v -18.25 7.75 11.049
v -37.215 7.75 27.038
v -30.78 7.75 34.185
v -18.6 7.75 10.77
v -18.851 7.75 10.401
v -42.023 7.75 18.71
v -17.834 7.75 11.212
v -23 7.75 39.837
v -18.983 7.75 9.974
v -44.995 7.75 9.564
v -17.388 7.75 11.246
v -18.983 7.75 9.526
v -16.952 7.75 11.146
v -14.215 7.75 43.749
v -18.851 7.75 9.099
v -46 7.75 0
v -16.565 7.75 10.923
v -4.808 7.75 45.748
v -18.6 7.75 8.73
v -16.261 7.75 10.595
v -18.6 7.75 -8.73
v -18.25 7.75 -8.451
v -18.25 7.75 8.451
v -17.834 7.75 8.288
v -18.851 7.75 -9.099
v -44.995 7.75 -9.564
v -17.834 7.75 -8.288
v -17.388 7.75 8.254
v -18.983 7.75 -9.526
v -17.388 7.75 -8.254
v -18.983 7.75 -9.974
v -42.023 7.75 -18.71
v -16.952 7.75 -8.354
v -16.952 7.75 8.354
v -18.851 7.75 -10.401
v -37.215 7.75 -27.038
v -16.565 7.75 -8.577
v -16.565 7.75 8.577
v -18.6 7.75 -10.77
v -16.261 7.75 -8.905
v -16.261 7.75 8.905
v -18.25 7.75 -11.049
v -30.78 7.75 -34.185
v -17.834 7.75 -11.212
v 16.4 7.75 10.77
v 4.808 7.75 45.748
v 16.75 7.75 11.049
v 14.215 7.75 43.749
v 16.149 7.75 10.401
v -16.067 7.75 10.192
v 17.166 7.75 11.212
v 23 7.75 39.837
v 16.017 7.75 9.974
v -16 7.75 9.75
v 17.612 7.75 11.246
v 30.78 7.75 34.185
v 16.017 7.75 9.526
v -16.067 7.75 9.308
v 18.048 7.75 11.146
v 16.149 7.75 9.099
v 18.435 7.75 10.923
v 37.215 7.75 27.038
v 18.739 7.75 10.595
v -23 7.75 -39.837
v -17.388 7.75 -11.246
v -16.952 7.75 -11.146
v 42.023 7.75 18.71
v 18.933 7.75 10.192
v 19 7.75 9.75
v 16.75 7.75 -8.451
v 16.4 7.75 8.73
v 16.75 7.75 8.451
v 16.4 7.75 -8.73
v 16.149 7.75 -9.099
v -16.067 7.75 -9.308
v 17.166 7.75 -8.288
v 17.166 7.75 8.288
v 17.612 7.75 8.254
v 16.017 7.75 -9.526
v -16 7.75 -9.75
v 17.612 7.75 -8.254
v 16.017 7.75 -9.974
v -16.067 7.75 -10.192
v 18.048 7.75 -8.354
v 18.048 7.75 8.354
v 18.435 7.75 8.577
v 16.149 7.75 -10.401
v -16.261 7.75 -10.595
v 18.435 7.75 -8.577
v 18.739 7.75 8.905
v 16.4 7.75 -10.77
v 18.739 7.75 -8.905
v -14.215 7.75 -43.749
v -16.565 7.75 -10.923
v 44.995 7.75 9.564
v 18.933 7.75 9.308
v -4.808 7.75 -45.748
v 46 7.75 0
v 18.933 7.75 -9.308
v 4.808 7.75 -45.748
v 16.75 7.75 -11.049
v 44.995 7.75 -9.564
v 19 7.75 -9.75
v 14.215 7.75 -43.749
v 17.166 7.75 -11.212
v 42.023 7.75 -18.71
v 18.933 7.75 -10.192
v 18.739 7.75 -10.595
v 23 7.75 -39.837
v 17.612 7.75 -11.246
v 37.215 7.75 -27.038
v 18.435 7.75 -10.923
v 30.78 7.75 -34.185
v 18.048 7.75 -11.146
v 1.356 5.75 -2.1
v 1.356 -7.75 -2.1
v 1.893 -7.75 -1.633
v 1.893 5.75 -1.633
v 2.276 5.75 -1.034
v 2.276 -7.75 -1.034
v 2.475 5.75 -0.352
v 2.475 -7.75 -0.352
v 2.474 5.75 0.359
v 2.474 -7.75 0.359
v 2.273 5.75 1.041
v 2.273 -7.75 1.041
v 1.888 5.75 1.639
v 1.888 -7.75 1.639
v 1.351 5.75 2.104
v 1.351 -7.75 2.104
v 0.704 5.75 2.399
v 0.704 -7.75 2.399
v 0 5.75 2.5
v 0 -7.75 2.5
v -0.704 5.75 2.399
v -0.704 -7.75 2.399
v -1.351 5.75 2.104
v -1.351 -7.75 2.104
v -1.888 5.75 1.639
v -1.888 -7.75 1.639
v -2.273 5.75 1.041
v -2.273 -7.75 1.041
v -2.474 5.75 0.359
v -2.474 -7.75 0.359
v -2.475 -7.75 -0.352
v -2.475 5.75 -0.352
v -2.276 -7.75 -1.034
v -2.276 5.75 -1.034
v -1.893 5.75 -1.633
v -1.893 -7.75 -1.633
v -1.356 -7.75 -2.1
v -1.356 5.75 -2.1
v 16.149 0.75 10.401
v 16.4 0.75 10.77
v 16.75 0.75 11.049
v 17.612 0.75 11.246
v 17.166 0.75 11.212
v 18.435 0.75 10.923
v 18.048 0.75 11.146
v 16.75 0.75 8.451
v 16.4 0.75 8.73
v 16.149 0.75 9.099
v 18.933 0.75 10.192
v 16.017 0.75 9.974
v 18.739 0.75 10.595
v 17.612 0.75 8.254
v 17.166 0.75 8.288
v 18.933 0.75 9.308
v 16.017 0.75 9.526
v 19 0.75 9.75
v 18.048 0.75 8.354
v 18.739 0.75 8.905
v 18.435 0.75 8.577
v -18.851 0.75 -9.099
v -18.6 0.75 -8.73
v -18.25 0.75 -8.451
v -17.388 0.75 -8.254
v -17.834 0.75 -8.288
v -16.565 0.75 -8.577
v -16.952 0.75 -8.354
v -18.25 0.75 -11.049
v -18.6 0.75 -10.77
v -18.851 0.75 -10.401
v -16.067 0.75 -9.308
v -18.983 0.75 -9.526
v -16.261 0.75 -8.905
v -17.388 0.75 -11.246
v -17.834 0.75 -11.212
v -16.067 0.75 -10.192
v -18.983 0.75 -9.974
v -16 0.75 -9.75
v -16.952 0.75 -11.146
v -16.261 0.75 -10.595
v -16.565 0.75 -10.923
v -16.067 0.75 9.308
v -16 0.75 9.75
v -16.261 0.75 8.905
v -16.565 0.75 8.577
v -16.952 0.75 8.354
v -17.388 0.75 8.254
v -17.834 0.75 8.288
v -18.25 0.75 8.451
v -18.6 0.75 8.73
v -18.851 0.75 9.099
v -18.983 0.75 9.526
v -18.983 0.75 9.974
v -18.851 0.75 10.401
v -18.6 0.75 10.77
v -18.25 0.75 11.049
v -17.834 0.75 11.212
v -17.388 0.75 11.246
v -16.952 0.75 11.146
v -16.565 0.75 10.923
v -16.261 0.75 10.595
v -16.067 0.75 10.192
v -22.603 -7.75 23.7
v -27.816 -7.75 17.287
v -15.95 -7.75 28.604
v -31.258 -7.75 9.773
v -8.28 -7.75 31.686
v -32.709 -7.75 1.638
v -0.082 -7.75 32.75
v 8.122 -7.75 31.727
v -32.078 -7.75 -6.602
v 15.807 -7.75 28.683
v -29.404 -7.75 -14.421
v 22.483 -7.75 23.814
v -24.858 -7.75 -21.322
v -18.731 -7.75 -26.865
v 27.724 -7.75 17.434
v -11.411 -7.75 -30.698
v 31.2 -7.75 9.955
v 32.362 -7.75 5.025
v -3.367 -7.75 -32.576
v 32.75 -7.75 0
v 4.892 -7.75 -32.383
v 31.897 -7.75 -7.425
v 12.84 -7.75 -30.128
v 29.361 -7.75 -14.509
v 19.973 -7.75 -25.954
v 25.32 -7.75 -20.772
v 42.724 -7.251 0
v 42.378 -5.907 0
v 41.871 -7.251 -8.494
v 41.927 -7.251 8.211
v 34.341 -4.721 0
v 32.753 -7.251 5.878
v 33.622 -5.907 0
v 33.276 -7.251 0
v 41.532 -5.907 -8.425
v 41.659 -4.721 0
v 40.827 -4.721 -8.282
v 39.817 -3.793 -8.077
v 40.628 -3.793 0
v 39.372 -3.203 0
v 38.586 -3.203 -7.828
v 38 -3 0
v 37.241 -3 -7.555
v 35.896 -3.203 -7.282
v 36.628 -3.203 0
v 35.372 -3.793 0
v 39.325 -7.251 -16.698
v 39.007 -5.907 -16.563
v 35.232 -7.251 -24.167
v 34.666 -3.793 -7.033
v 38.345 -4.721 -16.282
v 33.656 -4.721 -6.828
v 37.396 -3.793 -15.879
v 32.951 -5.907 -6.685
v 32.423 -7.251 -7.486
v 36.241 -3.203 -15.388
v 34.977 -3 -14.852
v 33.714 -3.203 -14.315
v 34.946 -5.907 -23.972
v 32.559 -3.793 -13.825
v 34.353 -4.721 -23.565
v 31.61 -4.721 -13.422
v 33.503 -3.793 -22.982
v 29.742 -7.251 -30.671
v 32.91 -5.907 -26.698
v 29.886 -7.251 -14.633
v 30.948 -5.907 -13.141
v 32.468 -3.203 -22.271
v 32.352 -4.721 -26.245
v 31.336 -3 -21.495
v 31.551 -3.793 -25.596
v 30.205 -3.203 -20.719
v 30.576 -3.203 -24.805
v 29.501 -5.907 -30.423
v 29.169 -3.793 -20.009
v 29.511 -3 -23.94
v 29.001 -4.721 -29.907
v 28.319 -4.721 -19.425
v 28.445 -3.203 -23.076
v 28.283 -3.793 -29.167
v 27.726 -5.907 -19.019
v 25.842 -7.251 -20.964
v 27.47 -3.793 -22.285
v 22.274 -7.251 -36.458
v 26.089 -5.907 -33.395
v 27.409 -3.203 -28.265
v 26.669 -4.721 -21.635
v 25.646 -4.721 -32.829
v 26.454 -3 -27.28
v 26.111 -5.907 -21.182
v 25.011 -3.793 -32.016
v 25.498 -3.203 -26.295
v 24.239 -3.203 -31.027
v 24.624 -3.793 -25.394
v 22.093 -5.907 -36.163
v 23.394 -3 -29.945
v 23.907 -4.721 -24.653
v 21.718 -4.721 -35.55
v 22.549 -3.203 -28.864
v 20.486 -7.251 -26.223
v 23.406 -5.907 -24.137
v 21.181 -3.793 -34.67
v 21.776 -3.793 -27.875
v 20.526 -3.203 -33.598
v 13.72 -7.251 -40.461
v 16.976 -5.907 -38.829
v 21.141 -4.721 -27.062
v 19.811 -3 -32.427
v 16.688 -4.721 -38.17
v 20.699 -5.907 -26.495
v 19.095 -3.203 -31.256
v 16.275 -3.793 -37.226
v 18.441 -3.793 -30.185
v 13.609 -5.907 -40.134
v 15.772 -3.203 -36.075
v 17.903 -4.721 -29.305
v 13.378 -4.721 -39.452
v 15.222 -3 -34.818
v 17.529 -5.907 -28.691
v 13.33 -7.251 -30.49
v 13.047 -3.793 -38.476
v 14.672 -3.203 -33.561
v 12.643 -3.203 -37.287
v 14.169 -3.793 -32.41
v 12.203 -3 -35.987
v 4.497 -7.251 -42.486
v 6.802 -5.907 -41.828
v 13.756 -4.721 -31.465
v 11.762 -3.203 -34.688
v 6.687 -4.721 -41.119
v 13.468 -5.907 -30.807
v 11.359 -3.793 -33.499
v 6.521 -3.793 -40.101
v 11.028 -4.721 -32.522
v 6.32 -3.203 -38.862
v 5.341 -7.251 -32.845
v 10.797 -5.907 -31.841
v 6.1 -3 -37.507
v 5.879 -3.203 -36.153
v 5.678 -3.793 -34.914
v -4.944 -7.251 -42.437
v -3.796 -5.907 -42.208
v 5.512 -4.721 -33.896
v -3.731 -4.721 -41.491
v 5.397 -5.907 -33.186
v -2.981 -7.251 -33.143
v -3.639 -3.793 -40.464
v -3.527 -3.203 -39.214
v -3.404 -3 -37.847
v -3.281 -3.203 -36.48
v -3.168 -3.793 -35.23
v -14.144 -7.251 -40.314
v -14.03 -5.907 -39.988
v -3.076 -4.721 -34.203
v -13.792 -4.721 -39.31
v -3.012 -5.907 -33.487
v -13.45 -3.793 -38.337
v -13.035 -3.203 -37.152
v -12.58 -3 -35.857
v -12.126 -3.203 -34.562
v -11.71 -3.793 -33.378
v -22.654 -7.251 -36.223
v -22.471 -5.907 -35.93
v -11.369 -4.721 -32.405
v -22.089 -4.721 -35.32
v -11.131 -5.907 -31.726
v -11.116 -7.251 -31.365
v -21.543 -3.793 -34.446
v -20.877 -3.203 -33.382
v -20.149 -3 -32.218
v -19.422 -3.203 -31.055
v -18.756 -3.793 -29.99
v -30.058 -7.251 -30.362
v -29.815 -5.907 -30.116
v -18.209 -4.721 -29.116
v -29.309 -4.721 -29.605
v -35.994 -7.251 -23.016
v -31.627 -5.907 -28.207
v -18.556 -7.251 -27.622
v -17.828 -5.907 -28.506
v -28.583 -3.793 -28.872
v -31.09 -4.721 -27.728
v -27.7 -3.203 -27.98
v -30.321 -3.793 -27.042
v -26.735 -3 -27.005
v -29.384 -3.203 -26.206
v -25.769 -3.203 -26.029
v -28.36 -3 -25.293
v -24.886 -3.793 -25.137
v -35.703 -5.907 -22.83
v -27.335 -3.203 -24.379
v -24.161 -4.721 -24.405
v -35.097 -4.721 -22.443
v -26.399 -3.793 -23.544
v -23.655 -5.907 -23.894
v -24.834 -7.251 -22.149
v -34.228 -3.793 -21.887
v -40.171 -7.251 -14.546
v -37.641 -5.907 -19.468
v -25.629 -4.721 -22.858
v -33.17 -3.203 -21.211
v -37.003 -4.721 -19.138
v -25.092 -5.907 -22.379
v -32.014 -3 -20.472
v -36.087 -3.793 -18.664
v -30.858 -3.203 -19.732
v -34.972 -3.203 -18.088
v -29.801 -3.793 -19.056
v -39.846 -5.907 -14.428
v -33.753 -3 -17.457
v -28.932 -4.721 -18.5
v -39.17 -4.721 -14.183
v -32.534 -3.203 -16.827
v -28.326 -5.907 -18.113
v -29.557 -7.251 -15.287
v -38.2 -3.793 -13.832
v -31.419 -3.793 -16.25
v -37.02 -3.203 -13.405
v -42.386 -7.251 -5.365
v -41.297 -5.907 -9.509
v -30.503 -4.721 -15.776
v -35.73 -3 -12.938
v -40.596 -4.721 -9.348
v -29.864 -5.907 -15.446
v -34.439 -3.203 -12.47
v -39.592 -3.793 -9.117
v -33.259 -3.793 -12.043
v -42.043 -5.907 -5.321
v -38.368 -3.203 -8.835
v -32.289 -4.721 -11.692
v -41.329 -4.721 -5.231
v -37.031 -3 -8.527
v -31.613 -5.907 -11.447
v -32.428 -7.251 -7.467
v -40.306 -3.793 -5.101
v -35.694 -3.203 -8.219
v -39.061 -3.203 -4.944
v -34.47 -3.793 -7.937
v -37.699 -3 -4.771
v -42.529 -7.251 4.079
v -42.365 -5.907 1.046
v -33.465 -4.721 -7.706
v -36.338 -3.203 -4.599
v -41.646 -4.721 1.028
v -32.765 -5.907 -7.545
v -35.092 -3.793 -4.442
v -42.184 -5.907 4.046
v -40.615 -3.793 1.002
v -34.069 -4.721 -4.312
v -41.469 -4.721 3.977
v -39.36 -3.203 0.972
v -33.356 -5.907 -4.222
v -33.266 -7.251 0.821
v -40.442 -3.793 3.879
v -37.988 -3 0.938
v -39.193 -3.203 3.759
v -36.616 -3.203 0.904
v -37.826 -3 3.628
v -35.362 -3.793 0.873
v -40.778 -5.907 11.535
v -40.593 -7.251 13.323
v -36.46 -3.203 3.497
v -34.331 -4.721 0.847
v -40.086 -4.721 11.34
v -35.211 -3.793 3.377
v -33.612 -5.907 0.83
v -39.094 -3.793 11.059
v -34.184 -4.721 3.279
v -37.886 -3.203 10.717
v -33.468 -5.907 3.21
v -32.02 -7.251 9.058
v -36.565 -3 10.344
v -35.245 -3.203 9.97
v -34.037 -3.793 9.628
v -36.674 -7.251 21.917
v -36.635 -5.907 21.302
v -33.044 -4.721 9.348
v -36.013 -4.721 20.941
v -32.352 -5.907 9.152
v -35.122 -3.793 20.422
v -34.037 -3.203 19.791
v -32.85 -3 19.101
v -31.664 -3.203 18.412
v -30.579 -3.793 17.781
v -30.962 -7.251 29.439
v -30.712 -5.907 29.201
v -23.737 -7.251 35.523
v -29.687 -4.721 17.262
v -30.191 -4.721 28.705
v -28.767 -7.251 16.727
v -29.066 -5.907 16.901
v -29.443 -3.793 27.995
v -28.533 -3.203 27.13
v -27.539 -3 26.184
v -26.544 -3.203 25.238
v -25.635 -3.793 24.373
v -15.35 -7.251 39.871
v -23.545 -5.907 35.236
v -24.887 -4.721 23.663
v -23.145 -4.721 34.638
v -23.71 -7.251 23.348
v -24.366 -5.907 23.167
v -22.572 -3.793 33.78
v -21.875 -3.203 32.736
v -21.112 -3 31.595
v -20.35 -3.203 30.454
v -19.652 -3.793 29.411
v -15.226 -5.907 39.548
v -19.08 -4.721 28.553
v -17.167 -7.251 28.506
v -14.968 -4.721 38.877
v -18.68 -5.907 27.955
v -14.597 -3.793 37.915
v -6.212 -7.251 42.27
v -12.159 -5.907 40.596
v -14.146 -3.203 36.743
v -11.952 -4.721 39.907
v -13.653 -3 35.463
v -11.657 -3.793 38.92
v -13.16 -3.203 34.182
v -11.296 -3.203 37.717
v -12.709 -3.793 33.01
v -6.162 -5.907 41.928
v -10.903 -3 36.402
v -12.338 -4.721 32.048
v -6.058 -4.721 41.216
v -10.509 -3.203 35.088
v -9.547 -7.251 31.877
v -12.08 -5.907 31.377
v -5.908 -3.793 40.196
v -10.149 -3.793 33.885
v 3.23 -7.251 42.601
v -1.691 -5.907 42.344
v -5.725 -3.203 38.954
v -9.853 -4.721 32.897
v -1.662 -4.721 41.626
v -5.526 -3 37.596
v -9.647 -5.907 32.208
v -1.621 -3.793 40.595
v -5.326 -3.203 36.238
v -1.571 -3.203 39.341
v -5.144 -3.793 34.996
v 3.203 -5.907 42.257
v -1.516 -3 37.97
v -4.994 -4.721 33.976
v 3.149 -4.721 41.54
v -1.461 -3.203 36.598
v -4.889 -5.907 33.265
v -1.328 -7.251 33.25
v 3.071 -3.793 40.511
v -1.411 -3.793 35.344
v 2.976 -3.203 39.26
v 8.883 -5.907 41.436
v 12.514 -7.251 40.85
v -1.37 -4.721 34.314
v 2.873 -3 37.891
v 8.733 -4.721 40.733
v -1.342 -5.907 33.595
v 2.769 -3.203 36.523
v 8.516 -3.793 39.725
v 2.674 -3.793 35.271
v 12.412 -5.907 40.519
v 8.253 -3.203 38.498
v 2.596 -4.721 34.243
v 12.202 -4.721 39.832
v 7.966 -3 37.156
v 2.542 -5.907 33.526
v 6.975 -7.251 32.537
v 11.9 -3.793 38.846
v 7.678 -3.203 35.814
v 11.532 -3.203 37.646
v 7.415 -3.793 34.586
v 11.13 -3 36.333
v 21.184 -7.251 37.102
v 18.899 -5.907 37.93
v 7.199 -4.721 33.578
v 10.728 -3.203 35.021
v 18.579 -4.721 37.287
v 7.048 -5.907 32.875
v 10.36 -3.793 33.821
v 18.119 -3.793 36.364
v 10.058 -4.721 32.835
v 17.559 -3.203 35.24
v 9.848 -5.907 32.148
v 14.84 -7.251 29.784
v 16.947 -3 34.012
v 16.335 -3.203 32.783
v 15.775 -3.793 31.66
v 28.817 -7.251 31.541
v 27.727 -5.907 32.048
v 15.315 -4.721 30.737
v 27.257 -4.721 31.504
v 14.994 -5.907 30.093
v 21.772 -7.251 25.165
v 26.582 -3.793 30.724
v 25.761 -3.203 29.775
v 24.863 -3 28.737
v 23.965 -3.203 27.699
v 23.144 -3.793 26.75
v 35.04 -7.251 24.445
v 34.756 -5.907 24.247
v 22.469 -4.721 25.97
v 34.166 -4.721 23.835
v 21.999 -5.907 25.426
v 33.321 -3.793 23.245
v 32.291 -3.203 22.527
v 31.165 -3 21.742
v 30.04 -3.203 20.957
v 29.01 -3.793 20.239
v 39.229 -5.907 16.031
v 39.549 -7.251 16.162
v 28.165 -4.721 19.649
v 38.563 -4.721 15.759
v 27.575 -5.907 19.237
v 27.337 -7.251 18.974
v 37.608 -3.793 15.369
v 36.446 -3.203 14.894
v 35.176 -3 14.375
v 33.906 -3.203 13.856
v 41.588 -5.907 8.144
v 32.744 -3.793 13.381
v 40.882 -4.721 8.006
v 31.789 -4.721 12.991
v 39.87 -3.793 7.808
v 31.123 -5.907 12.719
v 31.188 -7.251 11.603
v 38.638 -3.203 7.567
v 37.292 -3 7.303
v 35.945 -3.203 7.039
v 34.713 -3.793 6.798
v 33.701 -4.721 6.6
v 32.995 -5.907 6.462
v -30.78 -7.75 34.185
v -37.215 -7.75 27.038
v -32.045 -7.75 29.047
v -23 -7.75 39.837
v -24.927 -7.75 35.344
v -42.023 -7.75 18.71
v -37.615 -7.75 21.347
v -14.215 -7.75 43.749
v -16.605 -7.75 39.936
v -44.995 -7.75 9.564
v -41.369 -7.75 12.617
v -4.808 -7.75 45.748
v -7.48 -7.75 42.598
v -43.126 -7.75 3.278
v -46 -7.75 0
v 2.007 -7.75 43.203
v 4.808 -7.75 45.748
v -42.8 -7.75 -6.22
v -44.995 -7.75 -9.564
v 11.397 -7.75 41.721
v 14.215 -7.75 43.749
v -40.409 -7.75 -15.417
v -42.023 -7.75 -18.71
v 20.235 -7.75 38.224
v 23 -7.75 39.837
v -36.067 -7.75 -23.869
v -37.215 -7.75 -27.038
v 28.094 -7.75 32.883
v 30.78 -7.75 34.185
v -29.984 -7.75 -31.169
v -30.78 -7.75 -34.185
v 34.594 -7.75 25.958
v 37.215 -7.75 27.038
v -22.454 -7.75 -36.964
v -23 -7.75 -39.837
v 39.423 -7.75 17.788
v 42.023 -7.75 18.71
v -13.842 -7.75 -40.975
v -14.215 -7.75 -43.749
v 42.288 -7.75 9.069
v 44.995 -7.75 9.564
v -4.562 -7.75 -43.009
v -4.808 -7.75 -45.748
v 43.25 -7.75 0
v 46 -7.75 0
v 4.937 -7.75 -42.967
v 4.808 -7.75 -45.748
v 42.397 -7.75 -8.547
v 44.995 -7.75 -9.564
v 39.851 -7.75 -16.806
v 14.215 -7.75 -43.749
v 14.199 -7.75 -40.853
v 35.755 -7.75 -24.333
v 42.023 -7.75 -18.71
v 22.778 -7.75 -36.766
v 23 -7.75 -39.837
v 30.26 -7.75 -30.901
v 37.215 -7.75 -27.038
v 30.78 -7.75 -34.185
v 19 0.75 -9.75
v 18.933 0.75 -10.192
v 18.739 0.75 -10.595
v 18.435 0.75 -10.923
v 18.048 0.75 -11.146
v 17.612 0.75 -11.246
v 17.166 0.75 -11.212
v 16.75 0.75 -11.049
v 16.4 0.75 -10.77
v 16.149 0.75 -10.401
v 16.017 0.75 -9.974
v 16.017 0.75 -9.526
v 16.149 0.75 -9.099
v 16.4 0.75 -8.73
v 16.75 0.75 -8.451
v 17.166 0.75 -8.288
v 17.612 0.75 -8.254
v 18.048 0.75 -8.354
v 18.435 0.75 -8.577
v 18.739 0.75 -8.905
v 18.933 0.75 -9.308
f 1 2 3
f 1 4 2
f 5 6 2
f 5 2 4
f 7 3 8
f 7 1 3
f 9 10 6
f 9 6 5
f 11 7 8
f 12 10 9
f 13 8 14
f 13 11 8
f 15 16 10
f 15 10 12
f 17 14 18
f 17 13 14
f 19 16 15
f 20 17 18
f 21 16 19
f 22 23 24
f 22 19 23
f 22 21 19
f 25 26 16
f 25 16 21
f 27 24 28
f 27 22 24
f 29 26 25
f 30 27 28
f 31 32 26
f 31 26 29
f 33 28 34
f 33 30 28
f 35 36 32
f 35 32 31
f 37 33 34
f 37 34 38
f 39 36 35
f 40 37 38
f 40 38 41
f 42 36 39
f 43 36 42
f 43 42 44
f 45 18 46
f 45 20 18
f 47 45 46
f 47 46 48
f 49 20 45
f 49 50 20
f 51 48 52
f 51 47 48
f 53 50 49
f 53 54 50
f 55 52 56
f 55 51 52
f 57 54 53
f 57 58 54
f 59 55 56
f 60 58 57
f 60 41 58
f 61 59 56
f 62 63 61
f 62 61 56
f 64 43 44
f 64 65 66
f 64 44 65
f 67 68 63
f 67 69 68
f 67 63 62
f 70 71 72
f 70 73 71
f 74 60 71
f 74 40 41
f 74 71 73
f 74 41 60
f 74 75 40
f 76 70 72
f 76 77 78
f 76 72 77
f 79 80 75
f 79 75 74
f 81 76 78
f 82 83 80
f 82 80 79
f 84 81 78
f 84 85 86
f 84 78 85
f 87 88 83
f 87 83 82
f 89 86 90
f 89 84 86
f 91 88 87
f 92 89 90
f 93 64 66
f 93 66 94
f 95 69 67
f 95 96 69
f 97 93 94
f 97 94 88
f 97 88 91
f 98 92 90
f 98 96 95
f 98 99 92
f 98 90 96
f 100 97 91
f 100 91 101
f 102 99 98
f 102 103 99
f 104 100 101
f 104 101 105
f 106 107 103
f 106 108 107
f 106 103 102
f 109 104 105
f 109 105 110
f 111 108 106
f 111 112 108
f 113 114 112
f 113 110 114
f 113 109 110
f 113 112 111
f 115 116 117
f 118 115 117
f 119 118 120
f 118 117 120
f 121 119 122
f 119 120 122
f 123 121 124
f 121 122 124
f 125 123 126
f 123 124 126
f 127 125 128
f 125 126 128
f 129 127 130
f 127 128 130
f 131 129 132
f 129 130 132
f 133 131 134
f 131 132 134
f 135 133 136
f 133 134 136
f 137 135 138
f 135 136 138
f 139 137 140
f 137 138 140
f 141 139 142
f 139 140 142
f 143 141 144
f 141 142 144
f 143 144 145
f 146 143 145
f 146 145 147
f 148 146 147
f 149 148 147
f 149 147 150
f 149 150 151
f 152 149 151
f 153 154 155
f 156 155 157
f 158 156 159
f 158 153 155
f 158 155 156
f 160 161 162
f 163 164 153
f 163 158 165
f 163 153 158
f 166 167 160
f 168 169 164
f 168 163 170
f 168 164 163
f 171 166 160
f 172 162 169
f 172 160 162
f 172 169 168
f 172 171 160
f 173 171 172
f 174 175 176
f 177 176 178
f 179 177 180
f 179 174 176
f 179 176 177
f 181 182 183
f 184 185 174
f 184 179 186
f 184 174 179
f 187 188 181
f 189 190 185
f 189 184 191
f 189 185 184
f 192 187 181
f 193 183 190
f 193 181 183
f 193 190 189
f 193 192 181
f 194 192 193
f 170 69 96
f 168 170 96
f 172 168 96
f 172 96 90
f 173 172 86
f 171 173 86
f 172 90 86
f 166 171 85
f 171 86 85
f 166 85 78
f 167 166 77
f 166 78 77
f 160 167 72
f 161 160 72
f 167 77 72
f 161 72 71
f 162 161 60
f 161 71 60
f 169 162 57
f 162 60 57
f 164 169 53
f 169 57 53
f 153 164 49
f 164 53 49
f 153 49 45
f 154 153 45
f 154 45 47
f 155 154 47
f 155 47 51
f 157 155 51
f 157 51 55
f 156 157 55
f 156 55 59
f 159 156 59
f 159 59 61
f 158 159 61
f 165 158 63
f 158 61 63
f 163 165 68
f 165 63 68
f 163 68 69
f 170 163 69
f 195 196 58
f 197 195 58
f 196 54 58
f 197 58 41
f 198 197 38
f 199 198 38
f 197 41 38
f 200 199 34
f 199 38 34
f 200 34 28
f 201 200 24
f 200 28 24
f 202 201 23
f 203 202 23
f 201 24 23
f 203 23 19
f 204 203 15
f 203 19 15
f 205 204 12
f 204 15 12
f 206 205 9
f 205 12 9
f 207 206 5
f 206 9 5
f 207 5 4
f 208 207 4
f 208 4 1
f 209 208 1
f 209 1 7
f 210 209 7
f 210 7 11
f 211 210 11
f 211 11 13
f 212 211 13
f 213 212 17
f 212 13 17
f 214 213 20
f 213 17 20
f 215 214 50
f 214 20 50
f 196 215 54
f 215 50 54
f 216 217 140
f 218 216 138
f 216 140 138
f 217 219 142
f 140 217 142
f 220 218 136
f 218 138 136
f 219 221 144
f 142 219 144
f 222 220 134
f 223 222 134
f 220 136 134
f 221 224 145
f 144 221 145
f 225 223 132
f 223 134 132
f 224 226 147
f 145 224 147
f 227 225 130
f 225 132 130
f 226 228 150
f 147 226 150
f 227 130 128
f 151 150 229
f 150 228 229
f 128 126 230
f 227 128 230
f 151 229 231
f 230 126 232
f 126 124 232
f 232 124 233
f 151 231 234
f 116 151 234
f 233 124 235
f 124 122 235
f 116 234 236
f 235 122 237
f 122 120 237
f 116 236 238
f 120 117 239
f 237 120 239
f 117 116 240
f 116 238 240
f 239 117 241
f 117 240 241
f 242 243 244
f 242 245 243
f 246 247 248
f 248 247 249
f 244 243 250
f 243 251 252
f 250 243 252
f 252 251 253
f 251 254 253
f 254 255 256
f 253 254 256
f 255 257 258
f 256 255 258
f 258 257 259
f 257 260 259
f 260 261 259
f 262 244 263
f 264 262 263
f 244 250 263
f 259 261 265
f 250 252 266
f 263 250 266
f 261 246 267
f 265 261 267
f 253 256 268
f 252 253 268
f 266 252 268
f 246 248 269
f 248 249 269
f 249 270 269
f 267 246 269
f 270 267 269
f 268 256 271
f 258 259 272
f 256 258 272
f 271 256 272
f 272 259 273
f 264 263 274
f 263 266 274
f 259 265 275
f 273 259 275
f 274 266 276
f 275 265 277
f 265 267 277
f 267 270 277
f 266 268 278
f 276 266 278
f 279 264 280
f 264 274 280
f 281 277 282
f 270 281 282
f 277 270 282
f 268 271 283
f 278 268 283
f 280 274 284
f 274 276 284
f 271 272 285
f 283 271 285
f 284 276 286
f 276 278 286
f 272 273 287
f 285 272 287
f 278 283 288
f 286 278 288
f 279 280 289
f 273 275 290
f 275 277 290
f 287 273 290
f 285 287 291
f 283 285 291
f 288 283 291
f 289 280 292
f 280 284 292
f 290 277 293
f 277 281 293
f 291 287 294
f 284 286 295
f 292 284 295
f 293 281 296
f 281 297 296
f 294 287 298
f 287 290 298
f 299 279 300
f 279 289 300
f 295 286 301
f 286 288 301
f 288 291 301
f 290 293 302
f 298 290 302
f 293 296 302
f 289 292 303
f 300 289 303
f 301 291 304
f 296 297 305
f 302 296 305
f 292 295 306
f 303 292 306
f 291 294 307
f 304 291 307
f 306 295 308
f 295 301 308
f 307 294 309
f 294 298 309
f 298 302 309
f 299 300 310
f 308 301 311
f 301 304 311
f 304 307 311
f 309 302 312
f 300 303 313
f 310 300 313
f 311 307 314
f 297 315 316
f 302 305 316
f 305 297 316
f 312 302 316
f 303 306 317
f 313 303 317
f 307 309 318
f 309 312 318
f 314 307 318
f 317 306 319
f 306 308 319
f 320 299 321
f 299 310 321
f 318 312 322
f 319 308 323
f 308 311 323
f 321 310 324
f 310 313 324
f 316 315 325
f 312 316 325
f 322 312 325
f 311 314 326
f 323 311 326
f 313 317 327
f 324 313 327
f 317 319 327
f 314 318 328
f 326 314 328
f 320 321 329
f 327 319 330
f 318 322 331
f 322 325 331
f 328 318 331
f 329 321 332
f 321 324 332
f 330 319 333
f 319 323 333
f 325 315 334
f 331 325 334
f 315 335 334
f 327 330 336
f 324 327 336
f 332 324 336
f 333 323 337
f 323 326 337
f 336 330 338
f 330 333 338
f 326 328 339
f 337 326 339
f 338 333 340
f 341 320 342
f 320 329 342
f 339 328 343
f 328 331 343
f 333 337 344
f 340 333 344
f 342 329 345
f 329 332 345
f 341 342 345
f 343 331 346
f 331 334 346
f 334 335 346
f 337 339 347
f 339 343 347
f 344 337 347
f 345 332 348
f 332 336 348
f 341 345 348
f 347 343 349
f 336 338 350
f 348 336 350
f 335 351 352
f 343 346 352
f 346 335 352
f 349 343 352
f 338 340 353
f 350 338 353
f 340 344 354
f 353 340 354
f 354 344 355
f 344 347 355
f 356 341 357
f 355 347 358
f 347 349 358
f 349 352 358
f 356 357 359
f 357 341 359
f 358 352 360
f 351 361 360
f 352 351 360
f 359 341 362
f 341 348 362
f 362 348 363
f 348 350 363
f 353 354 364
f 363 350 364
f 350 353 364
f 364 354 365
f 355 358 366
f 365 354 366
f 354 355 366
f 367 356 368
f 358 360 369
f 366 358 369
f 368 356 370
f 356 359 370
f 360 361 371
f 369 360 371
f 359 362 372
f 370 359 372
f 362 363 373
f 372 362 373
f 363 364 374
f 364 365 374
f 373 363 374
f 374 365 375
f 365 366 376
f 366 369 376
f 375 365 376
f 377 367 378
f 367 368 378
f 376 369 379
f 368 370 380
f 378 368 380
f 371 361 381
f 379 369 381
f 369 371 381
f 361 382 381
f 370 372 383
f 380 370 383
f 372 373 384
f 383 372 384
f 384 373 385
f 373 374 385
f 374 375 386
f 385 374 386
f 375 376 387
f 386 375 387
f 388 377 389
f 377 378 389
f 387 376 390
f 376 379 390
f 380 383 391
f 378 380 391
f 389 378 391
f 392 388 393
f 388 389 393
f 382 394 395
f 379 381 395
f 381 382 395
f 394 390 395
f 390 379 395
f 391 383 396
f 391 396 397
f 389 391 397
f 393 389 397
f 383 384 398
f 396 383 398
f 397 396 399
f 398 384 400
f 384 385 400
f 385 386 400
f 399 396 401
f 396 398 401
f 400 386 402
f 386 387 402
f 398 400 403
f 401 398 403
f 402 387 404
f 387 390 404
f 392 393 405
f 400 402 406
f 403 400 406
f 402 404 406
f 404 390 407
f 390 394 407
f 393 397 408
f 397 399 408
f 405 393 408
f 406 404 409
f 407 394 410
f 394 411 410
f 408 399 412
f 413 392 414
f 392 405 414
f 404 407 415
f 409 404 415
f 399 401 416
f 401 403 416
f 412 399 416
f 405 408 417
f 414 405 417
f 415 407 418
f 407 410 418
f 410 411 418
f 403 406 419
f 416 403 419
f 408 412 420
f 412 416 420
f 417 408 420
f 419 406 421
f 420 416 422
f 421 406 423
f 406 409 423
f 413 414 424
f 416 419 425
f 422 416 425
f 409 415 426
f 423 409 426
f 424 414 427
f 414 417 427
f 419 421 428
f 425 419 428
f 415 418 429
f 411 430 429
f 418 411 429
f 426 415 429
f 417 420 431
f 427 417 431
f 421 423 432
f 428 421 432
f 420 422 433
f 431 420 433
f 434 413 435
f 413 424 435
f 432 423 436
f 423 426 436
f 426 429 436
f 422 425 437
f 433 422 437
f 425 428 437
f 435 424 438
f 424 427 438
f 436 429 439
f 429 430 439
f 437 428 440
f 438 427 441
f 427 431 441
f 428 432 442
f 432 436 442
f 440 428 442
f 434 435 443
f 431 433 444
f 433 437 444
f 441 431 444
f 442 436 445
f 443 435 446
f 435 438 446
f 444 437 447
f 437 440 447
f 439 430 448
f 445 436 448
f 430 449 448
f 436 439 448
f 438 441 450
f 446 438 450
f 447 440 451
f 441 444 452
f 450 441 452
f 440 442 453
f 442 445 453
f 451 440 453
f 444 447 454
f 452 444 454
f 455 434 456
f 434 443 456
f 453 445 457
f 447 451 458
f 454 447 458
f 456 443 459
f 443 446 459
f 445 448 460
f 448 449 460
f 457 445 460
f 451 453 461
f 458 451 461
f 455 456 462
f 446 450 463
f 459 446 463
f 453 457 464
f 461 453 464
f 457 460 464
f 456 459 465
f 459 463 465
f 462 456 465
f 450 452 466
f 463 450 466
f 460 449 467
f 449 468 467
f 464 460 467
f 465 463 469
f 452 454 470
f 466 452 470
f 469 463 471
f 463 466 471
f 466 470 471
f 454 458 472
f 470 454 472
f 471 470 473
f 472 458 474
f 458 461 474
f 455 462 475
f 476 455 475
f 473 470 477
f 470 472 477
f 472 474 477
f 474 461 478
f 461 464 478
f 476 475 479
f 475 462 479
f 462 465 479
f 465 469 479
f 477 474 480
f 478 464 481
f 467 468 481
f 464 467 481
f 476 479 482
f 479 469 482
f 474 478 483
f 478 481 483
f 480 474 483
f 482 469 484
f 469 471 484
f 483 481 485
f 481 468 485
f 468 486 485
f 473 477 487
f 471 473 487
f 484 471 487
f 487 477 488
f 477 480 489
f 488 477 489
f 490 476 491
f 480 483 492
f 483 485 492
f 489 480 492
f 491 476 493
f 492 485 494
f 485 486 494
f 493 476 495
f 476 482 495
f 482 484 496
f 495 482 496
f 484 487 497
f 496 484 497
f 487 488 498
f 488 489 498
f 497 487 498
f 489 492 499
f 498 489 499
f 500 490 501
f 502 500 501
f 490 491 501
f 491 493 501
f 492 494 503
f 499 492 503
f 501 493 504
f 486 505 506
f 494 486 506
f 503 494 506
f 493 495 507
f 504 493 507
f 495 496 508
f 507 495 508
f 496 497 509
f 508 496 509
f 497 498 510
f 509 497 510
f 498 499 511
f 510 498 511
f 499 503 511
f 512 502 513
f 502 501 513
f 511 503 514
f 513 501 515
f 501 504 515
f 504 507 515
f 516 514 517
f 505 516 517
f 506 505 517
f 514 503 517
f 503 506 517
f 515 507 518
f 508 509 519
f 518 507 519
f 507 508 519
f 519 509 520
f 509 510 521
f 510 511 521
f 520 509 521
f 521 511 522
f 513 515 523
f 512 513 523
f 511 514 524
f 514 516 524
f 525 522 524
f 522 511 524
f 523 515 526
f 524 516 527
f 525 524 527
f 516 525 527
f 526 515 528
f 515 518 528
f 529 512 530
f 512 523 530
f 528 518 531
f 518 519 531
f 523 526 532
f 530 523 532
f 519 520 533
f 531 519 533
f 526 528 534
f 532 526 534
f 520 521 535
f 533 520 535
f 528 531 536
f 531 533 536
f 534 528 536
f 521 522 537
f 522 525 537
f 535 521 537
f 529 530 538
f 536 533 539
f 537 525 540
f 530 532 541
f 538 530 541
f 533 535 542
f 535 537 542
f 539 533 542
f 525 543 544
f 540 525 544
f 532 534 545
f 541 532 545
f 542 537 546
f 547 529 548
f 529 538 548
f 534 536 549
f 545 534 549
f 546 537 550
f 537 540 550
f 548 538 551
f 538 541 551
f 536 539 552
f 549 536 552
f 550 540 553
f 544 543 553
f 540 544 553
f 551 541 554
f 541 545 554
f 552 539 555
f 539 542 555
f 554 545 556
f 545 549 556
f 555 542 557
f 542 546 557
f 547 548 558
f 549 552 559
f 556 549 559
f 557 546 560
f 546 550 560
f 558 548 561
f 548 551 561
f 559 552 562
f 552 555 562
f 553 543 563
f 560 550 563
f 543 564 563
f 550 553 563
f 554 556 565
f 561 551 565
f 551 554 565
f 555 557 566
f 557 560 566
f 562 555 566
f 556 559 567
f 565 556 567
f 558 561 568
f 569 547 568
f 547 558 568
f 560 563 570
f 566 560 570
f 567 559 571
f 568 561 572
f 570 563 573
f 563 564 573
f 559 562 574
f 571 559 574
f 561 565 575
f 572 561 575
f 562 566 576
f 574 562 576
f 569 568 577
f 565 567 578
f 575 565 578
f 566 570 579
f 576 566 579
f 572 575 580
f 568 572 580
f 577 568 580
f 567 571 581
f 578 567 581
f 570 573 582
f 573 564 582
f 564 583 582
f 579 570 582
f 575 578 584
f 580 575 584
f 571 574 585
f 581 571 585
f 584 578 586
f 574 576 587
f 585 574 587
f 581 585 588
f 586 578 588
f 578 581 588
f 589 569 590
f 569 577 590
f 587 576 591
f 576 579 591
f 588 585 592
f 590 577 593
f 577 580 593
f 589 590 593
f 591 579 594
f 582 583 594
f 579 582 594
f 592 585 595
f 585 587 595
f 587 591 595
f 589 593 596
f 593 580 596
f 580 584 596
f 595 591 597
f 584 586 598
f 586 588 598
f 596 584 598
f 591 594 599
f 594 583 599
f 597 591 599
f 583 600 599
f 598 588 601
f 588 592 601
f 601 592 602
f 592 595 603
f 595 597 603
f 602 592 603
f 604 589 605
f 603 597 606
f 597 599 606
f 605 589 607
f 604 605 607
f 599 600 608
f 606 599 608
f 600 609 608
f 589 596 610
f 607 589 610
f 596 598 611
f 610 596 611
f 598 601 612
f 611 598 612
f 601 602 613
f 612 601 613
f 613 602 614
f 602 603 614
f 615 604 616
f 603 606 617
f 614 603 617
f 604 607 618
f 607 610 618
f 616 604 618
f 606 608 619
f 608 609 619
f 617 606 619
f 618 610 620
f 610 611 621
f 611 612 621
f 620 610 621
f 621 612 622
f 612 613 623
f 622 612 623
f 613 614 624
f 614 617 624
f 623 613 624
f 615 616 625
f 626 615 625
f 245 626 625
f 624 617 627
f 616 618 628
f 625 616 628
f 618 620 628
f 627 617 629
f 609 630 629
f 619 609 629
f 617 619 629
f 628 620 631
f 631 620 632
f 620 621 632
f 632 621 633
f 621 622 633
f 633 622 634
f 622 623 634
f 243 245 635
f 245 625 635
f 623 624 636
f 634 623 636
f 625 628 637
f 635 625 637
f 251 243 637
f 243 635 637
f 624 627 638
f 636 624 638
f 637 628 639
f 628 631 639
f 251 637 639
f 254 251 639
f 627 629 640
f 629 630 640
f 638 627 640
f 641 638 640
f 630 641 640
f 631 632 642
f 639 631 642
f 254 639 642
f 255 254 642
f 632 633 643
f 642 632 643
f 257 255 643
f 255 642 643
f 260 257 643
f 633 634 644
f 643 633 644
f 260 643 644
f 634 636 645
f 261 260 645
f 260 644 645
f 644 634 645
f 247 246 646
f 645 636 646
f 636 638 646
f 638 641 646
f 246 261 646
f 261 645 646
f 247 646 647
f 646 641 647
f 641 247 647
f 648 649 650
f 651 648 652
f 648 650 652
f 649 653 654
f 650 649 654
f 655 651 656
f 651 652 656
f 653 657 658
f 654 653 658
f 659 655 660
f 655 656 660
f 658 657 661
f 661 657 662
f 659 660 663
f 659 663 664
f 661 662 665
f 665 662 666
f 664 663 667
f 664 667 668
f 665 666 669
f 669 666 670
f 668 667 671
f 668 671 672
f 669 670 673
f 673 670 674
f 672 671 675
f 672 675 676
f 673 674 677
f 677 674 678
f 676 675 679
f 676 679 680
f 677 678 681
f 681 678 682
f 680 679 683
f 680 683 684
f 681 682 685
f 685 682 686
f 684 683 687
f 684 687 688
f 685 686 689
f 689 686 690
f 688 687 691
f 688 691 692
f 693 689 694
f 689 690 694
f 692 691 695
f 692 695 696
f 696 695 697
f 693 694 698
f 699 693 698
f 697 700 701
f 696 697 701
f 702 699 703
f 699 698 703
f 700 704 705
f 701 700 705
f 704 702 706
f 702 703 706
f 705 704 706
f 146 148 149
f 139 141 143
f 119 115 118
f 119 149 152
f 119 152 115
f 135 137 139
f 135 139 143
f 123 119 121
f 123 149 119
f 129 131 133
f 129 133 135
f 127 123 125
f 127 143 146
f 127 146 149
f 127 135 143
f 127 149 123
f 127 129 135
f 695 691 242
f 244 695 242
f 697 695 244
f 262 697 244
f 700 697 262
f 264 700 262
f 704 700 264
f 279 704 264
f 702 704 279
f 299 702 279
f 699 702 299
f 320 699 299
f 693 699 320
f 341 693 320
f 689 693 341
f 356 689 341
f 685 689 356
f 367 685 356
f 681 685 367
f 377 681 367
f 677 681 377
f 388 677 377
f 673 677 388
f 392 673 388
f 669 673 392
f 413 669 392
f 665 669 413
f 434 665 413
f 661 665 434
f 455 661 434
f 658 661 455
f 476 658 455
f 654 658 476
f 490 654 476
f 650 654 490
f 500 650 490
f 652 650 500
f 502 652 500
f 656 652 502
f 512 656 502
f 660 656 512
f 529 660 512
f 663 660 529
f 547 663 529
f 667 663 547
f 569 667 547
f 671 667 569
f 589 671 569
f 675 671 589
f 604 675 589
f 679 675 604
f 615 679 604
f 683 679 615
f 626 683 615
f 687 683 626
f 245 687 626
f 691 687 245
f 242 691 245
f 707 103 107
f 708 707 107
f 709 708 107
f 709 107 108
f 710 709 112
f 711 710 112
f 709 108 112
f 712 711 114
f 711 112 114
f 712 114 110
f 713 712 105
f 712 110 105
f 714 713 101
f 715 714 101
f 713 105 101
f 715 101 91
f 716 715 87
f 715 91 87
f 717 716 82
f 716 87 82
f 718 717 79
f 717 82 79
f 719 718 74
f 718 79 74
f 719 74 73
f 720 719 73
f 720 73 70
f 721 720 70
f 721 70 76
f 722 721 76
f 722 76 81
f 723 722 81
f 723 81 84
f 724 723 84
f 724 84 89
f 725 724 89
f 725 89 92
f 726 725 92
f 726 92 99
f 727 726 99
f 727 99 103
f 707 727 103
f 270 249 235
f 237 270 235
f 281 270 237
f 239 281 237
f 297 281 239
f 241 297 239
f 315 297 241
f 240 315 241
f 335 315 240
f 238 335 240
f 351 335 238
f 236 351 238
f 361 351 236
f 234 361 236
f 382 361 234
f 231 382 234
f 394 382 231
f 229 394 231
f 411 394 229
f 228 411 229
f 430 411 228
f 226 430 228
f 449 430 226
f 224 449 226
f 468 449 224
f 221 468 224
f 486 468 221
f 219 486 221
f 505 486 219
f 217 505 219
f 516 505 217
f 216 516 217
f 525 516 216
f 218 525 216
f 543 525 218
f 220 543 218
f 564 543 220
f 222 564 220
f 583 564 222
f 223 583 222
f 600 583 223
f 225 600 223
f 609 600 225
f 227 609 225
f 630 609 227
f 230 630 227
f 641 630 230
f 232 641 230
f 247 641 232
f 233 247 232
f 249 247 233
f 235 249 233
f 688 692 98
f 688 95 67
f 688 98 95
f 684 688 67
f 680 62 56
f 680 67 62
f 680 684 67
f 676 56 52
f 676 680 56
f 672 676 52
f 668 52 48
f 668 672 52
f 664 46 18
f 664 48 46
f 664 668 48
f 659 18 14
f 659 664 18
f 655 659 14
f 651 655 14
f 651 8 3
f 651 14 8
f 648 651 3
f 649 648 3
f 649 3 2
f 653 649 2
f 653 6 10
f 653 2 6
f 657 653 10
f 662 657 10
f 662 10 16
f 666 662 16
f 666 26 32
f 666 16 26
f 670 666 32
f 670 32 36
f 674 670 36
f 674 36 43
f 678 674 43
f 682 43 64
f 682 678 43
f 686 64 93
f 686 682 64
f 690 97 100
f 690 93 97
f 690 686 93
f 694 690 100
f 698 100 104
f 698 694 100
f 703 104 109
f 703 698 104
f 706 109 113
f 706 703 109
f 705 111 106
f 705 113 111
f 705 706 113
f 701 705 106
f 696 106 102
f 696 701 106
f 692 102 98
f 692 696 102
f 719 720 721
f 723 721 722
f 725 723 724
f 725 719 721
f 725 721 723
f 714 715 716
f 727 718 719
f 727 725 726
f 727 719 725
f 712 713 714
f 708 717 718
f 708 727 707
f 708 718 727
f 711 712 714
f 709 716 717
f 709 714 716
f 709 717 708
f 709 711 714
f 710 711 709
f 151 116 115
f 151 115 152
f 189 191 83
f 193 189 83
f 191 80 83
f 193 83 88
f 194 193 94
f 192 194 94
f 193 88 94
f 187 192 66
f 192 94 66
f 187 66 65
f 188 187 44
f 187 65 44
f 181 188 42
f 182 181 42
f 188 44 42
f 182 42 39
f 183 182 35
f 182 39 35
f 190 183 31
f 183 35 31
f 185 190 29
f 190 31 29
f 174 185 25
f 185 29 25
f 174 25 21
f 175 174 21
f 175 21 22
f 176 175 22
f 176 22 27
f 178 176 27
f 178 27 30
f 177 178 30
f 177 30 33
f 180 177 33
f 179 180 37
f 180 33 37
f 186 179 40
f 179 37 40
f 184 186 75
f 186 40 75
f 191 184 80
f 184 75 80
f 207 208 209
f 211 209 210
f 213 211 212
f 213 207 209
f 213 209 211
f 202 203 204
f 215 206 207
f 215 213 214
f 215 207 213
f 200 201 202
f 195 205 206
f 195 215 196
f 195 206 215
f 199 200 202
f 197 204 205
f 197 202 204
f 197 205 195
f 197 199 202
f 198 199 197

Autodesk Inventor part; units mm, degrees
ref_plane "YZ Plane" through (0, 0, 0) normal (1, 0, 0) x (0, 1, 0)
ref_plane "XZ Plane" through (0, 0, 0) normal (0, 1, 0) x (-1, 0, 0)
ref_plane "XY Plane" through (0, 0, 0) normal (0, 0, 1) x (1, 0, 0)
sketch "Szkic1" plane through (0, 0, 0) normal (0, 0, 1) x (1, 0, 0)
  line L0 (0, 7.75) -> (46, 7.75)
  line L1 (46, 7.75) -> (46, -7.75)
  line L2 (46, -7.75) -> (42.75, -7.75)
  line L3 (0, -7.75) -> (0, 7.75)
  line L4 (33.25, -7.75) -> (0, -7.75)
  arc A0 (42.75, -7.75) -> (33.25, -7.75) centre (38, -7.75) ccw
  line L5 (0, -10.85) -> (0, 10.85) projected
  line L6 (0, -7.75) -> (33.25, -7.75)
  line L7 (42.75, -7.75) -> (46, -7.75)
  point P0 (0, 0)
  point P1 (0, 0)
  dimension "d0" = 46
  dimension "d1" = 15.5
  dimension "d9" = 38
  dimension "d10" = 4.75
  dimension "d11" = 0
revolve "Obrót1" add sketch "Szkic1" angle 360 about axis through (0, -10, 0) along (0, 1, 0)
sketch "Szkic2" plane through (0, -7.75, 0) normal (0, -1, 0) x (1, 0, 0)
  arc A0 (1.3565, -2.1) -> (-1.3565, -2.1) centre (0, 0) ccw
  line L0 (1.3565, -2.1) -> (-1.3565, -2.1)
  point P0 (0, -2.1)
  point P1 (0, 2.5)
  dimension "d5" = 5
  dimension "d15" = 4.6
extrude "Wyciągnięcie proste1" cut sketch "Szkic2" against normal blind 13.5
chamfer "Faza1" distance 0.5 angle 45 2 edges at (-42.75, -7.75, 0) (-33.25, -7.75, 0)
sketch "Szkic3" plane through (0, 7.75, 0) normal (0, 1, 0) x (1, 0, 0)
  circle A0 centre (-17.5, -9.75) radius 1.5
  line L0 (64.4, 0) -> (-64.4, 0) projected
  line L1 (0, 64.4) -> (0, -64.4) projected
  circle A1 centre (-17.5, 9.75) radius 1.5
  circle A2 centre (17.5, -9.75) radius 1.5
  circle A3 centre (17.5, 9.75) radius 1.5
  point P0 (0, 0)
  dimension "d16" = 3
  dimension "d17" = 9.75
  dimension "d18" = 17.5
extrude "Wyciągnięcie proste2" cut sketch "Szkic3" against normal blind 7
properties part number "Base_arm_mount"
